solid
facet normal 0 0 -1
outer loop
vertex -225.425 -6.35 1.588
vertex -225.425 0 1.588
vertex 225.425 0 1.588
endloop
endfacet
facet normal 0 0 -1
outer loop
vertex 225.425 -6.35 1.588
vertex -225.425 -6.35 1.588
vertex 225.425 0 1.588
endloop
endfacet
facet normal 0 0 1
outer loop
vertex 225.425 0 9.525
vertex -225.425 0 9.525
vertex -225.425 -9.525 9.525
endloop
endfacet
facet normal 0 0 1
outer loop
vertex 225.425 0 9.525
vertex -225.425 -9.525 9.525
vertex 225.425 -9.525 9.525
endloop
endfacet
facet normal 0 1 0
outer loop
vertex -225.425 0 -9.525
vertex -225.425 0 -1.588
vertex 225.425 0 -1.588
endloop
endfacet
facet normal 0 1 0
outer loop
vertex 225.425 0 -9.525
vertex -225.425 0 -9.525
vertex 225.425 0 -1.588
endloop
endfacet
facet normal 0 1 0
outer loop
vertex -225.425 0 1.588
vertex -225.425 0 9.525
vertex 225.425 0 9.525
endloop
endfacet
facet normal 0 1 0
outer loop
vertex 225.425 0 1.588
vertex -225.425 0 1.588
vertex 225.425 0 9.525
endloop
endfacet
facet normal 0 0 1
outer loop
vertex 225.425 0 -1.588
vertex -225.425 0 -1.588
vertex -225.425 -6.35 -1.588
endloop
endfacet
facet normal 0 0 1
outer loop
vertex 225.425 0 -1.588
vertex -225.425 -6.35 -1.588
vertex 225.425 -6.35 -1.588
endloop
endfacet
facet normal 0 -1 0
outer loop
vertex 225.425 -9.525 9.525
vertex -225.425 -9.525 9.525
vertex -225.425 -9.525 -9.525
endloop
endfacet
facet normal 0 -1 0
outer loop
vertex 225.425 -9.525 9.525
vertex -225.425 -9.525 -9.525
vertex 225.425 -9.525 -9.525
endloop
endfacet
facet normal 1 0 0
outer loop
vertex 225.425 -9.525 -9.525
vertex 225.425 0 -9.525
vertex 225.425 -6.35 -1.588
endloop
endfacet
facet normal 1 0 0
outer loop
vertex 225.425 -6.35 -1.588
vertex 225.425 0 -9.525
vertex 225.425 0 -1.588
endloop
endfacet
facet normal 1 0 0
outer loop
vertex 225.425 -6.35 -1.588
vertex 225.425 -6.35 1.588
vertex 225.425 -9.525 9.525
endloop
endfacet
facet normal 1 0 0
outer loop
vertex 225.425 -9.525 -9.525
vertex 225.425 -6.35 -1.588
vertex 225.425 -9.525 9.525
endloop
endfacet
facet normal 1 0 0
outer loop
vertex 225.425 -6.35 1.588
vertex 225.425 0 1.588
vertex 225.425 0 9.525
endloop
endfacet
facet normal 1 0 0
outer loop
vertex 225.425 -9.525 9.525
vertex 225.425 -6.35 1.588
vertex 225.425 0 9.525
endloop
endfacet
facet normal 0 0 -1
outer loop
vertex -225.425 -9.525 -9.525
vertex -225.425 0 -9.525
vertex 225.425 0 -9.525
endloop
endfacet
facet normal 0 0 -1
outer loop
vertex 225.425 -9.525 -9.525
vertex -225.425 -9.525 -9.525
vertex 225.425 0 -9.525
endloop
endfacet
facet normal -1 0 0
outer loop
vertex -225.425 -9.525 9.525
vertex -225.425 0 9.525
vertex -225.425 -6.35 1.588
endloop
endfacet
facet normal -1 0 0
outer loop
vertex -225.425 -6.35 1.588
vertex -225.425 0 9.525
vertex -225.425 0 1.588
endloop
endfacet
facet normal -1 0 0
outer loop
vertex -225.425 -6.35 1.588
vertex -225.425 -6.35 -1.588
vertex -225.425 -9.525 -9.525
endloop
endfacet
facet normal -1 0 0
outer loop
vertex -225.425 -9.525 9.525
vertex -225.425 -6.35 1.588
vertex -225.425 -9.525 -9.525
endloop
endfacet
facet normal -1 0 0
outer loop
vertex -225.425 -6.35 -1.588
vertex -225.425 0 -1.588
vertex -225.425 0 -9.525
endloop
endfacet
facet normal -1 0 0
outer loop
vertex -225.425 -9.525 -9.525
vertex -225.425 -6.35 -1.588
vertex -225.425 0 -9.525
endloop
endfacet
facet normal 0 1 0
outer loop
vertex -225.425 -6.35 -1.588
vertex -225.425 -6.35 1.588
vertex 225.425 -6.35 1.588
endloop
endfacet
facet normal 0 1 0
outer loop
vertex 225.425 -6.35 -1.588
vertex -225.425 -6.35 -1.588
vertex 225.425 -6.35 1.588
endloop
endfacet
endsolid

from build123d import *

# Parameters (mm, degrees)
F0_W     = 450.85
F0_H     = 7.9375
F0_H_2   = 3.175
F1_DEPTH = 9.525
F2_DEPTH = 6.35


with BuildPart() as f1:
    # F0 (on Front) → F1 (new body)
    with BuildSketch(Plane.XZ):
        with Locations((0, 5.55625)):
            Rectangle(F0_W, F0_H)
        Rectangle(F0_W, F0_H_2)
        with Locations((0, -5.55625)):
            Rectangle(F0_W, F0_H)
    extrude(amount=F1_DEPTH)

    # F0 (on Front) → F2 (cut)
    with BuildSketch(Plane.XZ):
        Rectangle(F0_W, F0_H_2)
    extrude(amount=F2_DEPTH, mode=Mode.SUBTRACT)


solid = f1.part
